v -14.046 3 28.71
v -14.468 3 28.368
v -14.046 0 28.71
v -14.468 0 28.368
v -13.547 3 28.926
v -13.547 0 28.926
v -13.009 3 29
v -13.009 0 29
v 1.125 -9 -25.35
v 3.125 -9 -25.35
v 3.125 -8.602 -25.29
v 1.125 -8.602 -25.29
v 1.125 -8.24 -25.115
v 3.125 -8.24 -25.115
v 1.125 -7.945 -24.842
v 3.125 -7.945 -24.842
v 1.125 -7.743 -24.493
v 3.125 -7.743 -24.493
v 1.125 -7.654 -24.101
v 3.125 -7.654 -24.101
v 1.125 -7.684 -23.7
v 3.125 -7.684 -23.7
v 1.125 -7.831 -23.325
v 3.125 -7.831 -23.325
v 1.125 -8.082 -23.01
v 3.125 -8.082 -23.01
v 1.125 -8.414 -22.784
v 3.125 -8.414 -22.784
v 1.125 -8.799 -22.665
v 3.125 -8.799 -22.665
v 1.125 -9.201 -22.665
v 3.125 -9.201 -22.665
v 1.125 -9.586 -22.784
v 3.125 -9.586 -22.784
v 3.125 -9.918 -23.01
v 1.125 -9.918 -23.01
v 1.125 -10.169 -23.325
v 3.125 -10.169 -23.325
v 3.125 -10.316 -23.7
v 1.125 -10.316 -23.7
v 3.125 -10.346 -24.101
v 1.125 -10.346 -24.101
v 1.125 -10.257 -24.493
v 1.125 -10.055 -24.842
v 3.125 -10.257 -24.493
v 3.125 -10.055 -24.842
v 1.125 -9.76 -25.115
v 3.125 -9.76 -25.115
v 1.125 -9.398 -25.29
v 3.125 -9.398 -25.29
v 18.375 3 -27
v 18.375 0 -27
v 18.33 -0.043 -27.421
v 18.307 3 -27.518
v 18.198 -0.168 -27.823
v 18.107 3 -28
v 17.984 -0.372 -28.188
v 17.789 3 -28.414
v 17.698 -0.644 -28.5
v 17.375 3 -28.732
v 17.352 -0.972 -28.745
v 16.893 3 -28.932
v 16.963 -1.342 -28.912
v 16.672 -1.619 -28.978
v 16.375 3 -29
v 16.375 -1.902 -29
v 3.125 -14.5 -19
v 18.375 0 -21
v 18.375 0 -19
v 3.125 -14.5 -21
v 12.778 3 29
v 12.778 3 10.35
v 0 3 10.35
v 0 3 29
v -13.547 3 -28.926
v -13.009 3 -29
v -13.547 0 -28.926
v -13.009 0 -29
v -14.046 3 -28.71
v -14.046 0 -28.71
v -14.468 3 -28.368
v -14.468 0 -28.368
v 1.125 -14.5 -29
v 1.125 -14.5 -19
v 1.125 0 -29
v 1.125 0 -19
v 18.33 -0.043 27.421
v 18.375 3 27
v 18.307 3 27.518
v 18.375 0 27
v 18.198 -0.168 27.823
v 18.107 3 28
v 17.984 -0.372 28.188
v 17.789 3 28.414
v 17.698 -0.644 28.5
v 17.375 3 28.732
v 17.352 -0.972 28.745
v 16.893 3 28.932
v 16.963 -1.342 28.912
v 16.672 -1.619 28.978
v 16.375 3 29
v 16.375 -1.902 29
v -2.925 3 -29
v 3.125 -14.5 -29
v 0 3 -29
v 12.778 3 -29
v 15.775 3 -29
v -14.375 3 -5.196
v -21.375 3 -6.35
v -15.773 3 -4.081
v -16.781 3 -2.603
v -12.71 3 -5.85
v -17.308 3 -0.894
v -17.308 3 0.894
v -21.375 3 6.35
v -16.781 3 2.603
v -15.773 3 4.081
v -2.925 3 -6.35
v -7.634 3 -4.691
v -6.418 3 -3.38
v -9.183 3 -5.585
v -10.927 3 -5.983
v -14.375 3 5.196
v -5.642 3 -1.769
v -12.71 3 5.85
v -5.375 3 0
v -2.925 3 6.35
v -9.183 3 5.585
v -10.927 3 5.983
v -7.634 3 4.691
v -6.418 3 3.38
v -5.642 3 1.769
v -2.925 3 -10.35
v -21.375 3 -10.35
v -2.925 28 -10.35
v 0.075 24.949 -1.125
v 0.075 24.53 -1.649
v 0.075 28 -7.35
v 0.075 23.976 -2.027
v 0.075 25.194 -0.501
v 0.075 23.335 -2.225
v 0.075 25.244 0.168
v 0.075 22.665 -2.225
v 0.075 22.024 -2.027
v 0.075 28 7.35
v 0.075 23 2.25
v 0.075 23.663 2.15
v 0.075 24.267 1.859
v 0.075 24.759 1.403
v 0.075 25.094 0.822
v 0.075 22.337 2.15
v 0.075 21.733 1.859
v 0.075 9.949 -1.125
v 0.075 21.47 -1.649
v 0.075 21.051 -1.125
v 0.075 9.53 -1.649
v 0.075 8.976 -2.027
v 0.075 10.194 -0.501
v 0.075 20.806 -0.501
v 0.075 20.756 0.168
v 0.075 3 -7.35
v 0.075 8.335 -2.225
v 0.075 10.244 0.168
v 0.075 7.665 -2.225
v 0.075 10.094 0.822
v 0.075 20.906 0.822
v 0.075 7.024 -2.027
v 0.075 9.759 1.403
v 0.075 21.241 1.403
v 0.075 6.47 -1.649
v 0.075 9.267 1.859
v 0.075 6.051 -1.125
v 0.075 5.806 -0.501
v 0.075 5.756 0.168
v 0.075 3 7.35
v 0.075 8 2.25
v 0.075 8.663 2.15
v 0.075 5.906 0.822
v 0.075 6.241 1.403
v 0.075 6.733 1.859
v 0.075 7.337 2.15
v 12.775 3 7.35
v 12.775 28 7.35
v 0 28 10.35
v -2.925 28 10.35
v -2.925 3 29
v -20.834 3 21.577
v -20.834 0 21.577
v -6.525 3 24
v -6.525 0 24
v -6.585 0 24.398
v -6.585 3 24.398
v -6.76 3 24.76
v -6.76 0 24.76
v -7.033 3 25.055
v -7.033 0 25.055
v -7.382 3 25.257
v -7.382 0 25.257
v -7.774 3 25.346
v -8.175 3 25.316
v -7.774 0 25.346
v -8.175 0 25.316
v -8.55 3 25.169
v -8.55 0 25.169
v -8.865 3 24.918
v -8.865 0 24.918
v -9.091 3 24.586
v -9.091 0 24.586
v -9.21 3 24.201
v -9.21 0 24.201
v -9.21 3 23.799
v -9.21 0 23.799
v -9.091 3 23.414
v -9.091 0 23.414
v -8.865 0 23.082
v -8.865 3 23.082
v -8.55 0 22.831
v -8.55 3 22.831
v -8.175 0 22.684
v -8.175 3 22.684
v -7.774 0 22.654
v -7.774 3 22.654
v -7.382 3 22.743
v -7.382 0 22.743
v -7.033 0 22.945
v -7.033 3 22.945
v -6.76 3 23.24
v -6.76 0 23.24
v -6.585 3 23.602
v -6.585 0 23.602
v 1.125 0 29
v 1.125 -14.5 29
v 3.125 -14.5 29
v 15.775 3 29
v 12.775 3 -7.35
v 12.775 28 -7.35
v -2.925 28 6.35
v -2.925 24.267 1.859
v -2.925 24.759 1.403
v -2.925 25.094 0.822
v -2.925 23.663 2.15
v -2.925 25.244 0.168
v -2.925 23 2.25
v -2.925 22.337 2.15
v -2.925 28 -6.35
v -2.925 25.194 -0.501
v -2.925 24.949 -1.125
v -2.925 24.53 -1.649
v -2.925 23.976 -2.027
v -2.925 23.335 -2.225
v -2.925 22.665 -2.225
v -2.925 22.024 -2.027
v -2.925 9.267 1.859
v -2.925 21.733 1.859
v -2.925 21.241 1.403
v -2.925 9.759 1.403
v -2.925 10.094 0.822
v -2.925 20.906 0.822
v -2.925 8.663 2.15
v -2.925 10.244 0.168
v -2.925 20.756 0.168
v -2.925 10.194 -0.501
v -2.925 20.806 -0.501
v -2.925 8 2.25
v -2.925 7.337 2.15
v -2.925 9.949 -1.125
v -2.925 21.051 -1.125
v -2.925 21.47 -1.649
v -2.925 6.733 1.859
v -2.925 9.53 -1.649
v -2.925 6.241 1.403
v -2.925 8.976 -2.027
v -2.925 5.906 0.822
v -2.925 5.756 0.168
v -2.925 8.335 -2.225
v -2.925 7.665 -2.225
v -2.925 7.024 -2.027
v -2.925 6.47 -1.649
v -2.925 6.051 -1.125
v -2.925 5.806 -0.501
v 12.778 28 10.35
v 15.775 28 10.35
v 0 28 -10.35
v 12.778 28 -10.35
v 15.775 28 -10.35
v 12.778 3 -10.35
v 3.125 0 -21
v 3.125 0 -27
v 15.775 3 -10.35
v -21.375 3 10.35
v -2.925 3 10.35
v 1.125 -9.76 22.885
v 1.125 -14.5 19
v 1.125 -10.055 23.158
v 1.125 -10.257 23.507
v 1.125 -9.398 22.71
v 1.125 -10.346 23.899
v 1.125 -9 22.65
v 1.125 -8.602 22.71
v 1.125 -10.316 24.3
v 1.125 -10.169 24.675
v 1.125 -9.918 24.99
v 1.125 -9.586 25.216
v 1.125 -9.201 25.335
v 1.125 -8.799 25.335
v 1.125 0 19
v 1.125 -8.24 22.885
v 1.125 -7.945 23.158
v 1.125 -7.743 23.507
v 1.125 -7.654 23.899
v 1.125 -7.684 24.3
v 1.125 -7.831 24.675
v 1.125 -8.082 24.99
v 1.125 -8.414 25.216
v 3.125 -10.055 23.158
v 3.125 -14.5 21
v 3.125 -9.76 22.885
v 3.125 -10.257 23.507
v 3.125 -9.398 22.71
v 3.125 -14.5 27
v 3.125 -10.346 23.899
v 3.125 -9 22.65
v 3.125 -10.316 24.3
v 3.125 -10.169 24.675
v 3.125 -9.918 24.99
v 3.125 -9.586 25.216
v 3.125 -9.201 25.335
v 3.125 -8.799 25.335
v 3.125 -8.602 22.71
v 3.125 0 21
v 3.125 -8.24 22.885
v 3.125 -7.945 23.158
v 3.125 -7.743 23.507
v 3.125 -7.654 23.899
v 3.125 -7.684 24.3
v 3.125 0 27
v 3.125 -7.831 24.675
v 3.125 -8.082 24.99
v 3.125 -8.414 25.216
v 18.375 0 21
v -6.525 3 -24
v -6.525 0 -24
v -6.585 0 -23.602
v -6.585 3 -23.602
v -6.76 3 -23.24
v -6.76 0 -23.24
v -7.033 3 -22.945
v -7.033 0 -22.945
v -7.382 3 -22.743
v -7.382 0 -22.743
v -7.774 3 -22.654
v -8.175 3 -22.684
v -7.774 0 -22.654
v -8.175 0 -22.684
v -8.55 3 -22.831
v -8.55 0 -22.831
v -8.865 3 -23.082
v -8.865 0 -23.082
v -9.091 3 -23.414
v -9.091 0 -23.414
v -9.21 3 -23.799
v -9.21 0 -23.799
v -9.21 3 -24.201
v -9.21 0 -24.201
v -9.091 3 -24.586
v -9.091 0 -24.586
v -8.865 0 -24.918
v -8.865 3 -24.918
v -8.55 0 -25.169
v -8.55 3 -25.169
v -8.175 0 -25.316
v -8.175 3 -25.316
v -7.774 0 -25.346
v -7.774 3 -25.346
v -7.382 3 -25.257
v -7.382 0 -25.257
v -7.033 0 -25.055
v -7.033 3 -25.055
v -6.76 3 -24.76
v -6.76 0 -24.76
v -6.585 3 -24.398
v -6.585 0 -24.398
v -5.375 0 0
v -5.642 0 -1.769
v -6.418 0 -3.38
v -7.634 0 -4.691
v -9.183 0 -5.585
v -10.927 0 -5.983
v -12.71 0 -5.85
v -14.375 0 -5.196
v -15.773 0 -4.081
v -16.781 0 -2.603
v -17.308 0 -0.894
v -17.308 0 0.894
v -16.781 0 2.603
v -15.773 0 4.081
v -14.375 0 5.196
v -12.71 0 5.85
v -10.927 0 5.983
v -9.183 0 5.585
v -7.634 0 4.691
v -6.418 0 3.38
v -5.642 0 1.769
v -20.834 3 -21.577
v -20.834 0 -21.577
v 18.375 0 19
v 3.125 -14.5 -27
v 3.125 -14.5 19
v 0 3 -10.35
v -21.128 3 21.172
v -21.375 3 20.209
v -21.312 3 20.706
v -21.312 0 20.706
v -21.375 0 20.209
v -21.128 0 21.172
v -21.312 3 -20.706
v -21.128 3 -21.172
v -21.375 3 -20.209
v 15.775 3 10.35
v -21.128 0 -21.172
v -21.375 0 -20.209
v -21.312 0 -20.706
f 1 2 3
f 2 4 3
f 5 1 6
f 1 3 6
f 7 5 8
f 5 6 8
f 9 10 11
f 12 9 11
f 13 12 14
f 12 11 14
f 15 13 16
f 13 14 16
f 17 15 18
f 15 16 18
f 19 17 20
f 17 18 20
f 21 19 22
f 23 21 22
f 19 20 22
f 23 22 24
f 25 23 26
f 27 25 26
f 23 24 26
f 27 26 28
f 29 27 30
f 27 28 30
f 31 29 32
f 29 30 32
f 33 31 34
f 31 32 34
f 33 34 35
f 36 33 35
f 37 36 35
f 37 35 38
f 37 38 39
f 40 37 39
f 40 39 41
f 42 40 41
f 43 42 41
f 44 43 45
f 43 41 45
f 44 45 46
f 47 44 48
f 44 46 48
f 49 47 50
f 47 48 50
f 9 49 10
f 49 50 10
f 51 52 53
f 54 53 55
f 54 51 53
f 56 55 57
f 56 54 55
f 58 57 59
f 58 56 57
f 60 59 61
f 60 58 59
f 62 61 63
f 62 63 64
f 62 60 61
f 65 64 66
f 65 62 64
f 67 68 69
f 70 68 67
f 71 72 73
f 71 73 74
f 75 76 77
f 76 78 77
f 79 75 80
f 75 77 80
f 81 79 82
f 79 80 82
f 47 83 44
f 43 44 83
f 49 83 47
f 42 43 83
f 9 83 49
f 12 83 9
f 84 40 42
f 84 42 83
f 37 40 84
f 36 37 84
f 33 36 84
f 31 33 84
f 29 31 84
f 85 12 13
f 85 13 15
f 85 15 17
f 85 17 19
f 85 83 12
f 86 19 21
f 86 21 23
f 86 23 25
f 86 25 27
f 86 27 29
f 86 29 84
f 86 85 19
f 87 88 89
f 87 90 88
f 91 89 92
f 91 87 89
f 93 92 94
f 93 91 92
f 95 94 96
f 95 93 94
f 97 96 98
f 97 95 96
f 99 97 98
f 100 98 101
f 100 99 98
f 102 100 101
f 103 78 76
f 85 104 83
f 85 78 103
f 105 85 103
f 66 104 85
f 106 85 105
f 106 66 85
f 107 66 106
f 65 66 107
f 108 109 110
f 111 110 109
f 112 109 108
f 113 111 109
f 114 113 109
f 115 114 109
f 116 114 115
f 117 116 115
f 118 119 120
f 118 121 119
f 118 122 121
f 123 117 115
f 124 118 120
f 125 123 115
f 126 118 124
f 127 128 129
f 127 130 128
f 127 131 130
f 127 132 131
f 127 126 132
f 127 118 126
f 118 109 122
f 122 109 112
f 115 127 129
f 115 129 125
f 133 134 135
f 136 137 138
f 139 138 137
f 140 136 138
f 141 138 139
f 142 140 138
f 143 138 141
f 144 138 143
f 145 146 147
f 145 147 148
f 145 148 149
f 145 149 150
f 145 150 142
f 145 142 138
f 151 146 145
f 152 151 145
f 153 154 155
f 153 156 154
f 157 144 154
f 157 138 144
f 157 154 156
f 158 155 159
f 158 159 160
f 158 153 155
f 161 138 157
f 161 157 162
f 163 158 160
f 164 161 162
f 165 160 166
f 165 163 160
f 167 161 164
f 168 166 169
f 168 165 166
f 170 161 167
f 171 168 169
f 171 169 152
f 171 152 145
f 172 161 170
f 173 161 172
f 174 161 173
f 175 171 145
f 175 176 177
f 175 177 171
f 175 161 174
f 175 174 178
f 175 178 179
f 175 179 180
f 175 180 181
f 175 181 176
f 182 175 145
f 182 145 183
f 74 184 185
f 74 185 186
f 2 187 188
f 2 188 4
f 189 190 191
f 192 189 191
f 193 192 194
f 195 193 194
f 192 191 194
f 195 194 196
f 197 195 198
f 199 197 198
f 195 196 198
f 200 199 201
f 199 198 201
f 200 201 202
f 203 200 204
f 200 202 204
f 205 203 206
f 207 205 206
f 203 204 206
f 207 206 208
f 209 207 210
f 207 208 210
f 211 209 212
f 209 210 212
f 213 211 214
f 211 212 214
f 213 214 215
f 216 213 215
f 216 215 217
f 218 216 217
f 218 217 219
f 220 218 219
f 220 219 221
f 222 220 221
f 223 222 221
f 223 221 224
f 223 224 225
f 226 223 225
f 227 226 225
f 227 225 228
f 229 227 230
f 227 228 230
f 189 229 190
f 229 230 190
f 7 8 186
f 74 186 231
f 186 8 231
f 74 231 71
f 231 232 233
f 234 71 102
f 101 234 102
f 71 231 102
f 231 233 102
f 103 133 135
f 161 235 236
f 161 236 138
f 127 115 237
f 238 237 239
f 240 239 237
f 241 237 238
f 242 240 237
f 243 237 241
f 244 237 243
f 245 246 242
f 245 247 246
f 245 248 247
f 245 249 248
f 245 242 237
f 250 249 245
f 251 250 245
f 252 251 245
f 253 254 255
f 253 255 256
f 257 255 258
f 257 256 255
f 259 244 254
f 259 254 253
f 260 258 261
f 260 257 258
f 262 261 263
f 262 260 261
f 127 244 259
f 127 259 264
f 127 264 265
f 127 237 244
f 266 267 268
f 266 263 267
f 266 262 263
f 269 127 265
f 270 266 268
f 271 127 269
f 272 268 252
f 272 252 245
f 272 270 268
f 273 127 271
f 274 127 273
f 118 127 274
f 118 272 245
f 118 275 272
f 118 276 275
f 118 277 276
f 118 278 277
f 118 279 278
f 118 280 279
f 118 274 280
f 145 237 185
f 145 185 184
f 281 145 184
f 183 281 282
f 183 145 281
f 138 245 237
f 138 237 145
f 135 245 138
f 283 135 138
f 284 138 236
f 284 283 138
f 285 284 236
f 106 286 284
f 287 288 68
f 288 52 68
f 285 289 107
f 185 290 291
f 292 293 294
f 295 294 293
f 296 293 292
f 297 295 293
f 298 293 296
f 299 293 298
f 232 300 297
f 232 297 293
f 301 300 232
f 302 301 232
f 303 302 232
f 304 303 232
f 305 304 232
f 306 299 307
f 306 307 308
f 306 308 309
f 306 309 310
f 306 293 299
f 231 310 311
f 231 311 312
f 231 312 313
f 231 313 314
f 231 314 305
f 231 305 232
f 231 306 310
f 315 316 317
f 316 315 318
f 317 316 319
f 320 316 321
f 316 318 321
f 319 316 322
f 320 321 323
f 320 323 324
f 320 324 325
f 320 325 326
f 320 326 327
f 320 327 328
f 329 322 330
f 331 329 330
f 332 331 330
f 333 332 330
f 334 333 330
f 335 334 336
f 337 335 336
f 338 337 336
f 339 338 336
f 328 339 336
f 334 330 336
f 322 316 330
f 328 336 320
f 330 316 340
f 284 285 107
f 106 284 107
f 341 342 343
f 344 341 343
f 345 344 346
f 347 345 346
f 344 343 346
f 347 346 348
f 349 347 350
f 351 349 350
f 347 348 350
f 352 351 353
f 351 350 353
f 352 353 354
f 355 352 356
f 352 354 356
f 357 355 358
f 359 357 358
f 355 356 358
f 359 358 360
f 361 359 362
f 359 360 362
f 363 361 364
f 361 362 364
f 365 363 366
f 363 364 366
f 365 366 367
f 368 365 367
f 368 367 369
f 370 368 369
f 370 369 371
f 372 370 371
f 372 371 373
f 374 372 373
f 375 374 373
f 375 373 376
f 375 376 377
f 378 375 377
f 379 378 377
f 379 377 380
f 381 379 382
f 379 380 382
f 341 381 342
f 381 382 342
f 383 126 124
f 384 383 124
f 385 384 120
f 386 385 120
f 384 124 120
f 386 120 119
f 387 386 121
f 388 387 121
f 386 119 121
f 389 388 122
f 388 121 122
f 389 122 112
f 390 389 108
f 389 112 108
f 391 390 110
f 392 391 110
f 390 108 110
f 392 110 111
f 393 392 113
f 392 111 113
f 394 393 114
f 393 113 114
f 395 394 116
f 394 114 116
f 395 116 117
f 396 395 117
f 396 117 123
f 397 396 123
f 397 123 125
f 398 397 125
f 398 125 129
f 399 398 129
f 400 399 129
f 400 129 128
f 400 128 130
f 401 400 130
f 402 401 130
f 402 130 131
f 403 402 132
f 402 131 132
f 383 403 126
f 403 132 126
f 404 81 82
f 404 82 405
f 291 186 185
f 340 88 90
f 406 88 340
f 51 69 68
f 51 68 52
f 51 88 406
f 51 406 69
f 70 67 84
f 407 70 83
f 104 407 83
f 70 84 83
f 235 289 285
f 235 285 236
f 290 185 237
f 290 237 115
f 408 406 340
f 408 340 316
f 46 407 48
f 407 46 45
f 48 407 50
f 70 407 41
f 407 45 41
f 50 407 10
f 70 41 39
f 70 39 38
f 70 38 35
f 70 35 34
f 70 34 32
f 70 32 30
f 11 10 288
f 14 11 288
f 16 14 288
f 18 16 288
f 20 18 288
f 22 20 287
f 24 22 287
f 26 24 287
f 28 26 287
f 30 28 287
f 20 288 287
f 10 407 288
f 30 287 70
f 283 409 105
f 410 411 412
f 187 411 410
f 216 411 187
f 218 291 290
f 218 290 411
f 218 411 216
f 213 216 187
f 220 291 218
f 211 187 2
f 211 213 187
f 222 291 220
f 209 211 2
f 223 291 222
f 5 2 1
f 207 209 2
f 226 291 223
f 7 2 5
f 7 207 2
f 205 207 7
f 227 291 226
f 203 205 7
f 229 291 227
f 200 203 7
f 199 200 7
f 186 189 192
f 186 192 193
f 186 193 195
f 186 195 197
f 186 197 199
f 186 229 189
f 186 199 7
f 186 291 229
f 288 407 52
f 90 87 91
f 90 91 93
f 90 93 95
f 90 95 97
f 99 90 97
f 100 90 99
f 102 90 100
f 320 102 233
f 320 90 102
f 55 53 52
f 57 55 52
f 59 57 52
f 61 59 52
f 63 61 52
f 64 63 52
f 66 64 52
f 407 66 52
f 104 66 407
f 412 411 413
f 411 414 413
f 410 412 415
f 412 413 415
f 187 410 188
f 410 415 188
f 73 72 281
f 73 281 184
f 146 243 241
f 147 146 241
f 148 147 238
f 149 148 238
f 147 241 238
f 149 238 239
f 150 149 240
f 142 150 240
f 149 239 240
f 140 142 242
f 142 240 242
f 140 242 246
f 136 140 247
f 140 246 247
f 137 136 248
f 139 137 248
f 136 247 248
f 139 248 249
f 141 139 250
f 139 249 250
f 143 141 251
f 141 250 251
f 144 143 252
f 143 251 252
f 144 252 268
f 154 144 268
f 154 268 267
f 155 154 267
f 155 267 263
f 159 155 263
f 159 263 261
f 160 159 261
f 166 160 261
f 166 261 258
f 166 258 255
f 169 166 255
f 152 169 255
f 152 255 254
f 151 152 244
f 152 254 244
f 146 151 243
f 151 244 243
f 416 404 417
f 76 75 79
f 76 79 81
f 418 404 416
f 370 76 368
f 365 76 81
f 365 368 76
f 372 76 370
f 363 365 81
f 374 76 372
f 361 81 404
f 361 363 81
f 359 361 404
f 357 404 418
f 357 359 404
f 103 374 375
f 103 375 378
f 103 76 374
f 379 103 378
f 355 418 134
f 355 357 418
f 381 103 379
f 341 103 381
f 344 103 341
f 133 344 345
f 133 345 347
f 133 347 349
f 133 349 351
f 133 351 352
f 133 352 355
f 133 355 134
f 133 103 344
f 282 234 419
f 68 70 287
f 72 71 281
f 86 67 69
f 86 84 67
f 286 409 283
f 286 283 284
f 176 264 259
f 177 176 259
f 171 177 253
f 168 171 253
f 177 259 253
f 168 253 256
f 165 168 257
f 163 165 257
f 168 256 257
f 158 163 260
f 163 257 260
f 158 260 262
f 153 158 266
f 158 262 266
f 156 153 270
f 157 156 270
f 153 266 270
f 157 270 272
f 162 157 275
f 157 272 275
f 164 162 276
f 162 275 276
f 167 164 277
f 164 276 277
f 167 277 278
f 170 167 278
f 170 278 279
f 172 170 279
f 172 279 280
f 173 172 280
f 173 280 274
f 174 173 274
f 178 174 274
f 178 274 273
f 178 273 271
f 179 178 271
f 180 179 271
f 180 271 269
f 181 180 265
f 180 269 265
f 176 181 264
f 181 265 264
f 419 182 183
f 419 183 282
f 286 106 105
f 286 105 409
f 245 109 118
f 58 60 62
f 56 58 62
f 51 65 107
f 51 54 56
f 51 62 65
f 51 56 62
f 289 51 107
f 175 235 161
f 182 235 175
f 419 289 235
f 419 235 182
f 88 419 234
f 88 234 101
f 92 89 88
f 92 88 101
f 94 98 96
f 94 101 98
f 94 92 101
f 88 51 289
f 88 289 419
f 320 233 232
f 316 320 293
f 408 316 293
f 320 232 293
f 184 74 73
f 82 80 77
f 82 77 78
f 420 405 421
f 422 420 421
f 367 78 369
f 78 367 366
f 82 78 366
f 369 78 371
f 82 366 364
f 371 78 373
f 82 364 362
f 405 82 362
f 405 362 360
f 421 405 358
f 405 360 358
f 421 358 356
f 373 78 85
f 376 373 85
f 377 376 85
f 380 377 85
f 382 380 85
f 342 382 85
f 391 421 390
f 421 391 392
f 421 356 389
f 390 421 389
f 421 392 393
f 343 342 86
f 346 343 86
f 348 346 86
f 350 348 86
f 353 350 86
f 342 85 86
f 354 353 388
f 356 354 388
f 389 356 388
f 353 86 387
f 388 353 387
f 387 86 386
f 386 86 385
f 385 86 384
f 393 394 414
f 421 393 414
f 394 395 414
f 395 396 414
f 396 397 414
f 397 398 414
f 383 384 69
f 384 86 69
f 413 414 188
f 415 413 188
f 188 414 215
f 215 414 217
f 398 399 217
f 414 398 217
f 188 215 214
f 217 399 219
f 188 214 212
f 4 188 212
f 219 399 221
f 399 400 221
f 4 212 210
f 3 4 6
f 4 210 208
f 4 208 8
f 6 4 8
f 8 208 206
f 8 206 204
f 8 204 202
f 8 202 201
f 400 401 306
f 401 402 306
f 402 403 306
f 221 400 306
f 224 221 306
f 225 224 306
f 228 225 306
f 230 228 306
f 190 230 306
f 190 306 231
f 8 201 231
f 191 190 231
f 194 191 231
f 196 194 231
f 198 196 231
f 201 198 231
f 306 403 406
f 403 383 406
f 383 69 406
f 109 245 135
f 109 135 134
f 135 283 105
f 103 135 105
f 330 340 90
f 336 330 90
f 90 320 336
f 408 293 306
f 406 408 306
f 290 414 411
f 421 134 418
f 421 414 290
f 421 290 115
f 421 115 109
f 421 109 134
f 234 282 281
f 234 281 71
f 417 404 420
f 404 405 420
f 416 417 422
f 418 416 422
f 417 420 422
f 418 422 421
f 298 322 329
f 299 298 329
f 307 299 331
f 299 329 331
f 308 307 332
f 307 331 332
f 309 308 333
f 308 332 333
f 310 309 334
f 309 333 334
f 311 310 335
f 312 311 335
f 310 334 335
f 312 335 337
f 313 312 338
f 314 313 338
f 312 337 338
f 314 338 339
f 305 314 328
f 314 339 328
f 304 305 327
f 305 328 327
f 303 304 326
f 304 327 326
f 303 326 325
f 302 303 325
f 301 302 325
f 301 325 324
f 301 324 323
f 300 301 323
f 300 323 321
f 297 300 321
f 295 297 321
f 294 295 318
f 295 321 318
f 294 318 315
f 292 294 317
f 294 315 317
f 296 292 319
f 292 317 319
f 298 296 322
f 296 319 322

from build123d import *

# Parameters (mm, degrees)
SKETCH1_W           = 36.75
SKETCH1_H           = 58
BOSS_EXTRUDE1_DEPTH = 3
SKETCH2_W           = 2
SKETCH2_H           = 10
BOSS_EXTRUDE2_DEPTH = 14.5
SKETCH3_R           = 1.35
CUT_EXTRUDE1_DEPTH  = 2
BOSS_EXTRUDE3_DEPTH = 25
SKETCH5_R           = 2.25
CUT_EXTRUDE2_DEPTH  = 3
SKETCH6_W           = 58
SKETCH6_H           = 3
BOSS_EXTRUDE4_DEPTH = 3
SKETCH7_R           = 6
CUT_EXTRUDE3_DEPTH  = 3
CUT_EXTRUDE4_DEPTH  = 3
SKETCH9_W           = 2
SKETCH9_H           = 14.5
BOSS_EXTRUDE5_DEPTH = 15.25
CUT_EXTRUDE5_DEPTH  = 80
SKETCH11_R          = 1.35
CUT_EXTRUDE6_DEPTH  = 3
FILLET1_R           = 2
SKETCH12_W          = 2.925
SKETCH12_H          = 18.65
SKETCH12_W_2        = 2.997200628
BOSS_EXTRUDE6_DEPTH = 25
CUT_EXTRUDE7_DEPTH  = 18.7
SKETCH14_W          = 18.45
SKETCH14_H          = 4
BOSS_EXTRUDE7_DEPTH = 25
CUT_EXTRUDE8_DEPTH  = 20.7


with BuildPart() as part:
    # Sketch1 → Boss-Extrude1 (new body)
    with BuildSketch(Plane(origin=(0, 0, 0), x_dir=(1, 0, 0), z_dir=(0, 1, 0))):
        Rectangle(SKETCH1_W, SKETCH1_H)
    extrude(amount=BOSS_EXTRUDE1_DEPTH)

    # Sketch2 → Boss-Extrude2 (add)
    with BuildSketch(Plane.XZ):
        with Locations((2.125, 24)):
            Rectangle(SKETCH2_W, SKETCH2_H)
        with Locations((2.125, -24)):
            Rectangle(SKETCH2_W, SKETCH2_H)
    extrude(amount=BOSS_EXTRUDE2_DEPTH)

    # Sketch3 → Cut-Extrude1 (cut)
    with BuildSketch(Plane(origin=(3.125, 0, 0), x_dir=(0, 0, -1), z_dir=(1, 0, 0))):
        with Locations((-24, -9)):
            Circle(SKETCH3_R)
        with Locations((24, -9)):
            Circle(SKETCH3_R)
    extrude(amount=-CUT_EXTRUDE1_DEPTH, mode=Mode.SUBTRACT)

    # Sketch4 → Boss-Extrude3 (add)
    with BuildSketch(Plane(origin=(0, 3, 0), x_dir=(1, 0, 0), z_dir=(0, 1, 0))):
        Polygon((12.775, 7.35), (0.075, 7.35), (0.075, -7.35), (12.775, -7.35), (15.775, -10.35), (-2.925, -10.35), (-2.925, 10.35), (15.775, 10.35), align=None)
    extrude(amount=BOSS_EXTRUDE3_DEPTH)

    # Sketch5 → Cut-Extrude2 (cut)
    with BuildSketch(Plane.ZY.offset(2.925)):
        with Locations((0, 8)):
            Circle(SKETCH5_R)
        with Locations((0, 23)):
            Circle(SKETCH5_R)
    extrude(amount=-CUT_EXTRUDE2_DEPTH, mode=Mode.SUBTRACT)

    # Sketch6 → Boss-Extrude4 (add)
    with BuildSketch(Plane.ZY.offset(18.375)):
        with Locations((0, 1.5)):
            Rectangle(SKETCH6_W, SKETCH6_H)
    extrude(amount=BOSS_EXTRUDE4_DEPTH)

    # Sketch7 → Cut-Extrude3 (cut)
    with BuildSketch(Plane(origin=(0, 3, 0), x_dir=(1, 0, 0), z_dir=(0, 1, 0))):
        with Locations((-11.375, 0)):
            Circle(SKETCH7_R)
    extrude(amount=-CUT_EXTRUDE3_DEPTH, mode=Mode.SUBTRACT)

    # Sketch8 → Cut-Extrude4 (cut)
    with BuildSketch(Plane(origin=(0, 3, 0), x_dir=(1, 0, 0), z_dir=(0, 1, 0))):
        Polygon((-21.375, 21), (-21.375, -21), (-13.875, -29), (-11.243766746, -32.586617788), (-32.637528156, -32.586617788), (-41.642373039, 35.783998083), (-13.875, 36.078995707), (-13.875, 29), align=None)
    extrude(amount=-CUT_EXTRUDE4_DEPTH, mode=Mode.SUBTRACT)

    # Sketch9 → Boss-Extrude5 (add)
    with BuildSketch(Plane(origin=(3.125, 0, 0), x_dir=(0, 0, -1), z_dir=(1, 0, 0))):
        with Locations((20, -7.25)):
            Rectangle(SKETCH9_W, SKETCH9_H)
        with Locations((28, -7.25)):
            Rectangle(SKETCH9_W, SKETCH9_H)
        with Locations((-28, -7.25)):
            Rectangle(SKETCH9_W, SKETCH9_H)
        with Locations((-20, -7.25)):
            Rectangle(SKETCH9_W, SKETCH9_H)
    extrude(amount=BOSS_EXTRUDE5_DEPTH)

    # Sketch10 → Cut-Extrude5 (cut, symmetric)
    with BuildSketch(Plane(origin=(0, 0, 27), x_dir=(-1, 0, 0), z_dir=(0, 0, -1))):
        Polygon((-18.375, 0), (-3.125, -14.5), (-3.818102744, -23.175648105), (-24.299297104, -22.135397869), (-27.68716384, 0.855740373), align=None)
    extrude(amount=CUT_EXTRUDE5_DEPTH, both=True, mode=Mode.SUBTRACT)

    # Sketch11 → Cut-Extrude6 (cut)
    with BuildSketch(Plane.XZ):
        with Locations((-7.875, 24)):
            Circle(SKETCH11_R)
        with Locations((-7.875, -24)):
            Circle(SKETCH11_R)
    extrude(amount=-CUT_EXTRUDE6_DEPTH, mode=Mode.SUBTRACT)

    # Fillet1
    fillet1_edges = [part.edges().sort_by_distance(p)[0] for p in [
        (-21.375, 1.5, 21),
        (-13.875, 1.5, 29),
        (-21.375, 1.5, -21),
        (-13.875, 1.5, -29),
        (18.375, 1.5, 29),
        (18.375, 1.5, -29),
    ]]
    fillet(fillet1_edges, radius=FILLET1_R)

    # Sketch12 → Boss-Extrude6 (add)
    with BuildSketch(Plane(origin=(0, 3, 0), x_dir=(1, 0, 0), z_dir=(0, 1, 0))):
        with Locations((-1.4625, -19.675)):
            Rectangle(SKETCH12_W, SKETCH12_H)
        with Locations((14.276399686, -19.675)):
            Rectangle(SKETCH12_W_2, SKETCH12_H)
        with Locations((-1.4625, 19.675)):
            Rectangle(SKETCH12_W, SKETCH12_H)
        with Locations((14.276399686, 19.675)):
            Rectangle(SKETCH12_W_2, SKETCH12_H)
    extrude(amount=BOSS_EXTRUDE6_DEPTH)

    # Sketch13 → Cut-Extrude7 (cut)
    with BuildSketch(Plane(origin=(15.775, 0, 0), x_dir=(0, 0, -1), z_dir=(1, 0, 0))):
        Polygon((-10.35, 28), (-29, 3), (-37.617706681, 3), (-37.617706681, 32.391457207), (-10.35, 32.391457207), align=None)
        Polygon((37.617706681, 32.391457207), (10.35, 32.391457207), (10.35, 28), (29, 3), (37.617706681, 3), align=None)
    extrude(amount=-CUT_EXTRUDE7_DEPTH, mode=Mode.SUBTRACT)

    # Sketch14 → Boss-Extrude7 (add)
    with BuildSketch(Plane(origin=(0, 3, 0), x_dir=(1, 0, 0), z_dir=(0, 1, 0))):
        with Locations((-12.15, 8.35)):
            Rectangle(SKETCH14_W, SKETCH14_H)
        with Locations((-12.15, -8.35)):
            Rectangle(SKETCH14_W, SKETCH14_H)
    extrude(amount=BOSS_EXTRUDE7_DEPTH)

    # Sketch15 → Cut-Extrude8 (cut)
    with BuildSketch(Plane.XY.offset(10.35)):
        Polygon((-2.925, 28), (-21.375, 3), (-26.960313264, 3), (-26.960313264, 29.401674183), (-2.925, 29.401674183), align=None)
    extrude(amount=-CUT_EXTRUDE8_DEPTH, mode=Mode.SUBTRACT)


solid = part.part
